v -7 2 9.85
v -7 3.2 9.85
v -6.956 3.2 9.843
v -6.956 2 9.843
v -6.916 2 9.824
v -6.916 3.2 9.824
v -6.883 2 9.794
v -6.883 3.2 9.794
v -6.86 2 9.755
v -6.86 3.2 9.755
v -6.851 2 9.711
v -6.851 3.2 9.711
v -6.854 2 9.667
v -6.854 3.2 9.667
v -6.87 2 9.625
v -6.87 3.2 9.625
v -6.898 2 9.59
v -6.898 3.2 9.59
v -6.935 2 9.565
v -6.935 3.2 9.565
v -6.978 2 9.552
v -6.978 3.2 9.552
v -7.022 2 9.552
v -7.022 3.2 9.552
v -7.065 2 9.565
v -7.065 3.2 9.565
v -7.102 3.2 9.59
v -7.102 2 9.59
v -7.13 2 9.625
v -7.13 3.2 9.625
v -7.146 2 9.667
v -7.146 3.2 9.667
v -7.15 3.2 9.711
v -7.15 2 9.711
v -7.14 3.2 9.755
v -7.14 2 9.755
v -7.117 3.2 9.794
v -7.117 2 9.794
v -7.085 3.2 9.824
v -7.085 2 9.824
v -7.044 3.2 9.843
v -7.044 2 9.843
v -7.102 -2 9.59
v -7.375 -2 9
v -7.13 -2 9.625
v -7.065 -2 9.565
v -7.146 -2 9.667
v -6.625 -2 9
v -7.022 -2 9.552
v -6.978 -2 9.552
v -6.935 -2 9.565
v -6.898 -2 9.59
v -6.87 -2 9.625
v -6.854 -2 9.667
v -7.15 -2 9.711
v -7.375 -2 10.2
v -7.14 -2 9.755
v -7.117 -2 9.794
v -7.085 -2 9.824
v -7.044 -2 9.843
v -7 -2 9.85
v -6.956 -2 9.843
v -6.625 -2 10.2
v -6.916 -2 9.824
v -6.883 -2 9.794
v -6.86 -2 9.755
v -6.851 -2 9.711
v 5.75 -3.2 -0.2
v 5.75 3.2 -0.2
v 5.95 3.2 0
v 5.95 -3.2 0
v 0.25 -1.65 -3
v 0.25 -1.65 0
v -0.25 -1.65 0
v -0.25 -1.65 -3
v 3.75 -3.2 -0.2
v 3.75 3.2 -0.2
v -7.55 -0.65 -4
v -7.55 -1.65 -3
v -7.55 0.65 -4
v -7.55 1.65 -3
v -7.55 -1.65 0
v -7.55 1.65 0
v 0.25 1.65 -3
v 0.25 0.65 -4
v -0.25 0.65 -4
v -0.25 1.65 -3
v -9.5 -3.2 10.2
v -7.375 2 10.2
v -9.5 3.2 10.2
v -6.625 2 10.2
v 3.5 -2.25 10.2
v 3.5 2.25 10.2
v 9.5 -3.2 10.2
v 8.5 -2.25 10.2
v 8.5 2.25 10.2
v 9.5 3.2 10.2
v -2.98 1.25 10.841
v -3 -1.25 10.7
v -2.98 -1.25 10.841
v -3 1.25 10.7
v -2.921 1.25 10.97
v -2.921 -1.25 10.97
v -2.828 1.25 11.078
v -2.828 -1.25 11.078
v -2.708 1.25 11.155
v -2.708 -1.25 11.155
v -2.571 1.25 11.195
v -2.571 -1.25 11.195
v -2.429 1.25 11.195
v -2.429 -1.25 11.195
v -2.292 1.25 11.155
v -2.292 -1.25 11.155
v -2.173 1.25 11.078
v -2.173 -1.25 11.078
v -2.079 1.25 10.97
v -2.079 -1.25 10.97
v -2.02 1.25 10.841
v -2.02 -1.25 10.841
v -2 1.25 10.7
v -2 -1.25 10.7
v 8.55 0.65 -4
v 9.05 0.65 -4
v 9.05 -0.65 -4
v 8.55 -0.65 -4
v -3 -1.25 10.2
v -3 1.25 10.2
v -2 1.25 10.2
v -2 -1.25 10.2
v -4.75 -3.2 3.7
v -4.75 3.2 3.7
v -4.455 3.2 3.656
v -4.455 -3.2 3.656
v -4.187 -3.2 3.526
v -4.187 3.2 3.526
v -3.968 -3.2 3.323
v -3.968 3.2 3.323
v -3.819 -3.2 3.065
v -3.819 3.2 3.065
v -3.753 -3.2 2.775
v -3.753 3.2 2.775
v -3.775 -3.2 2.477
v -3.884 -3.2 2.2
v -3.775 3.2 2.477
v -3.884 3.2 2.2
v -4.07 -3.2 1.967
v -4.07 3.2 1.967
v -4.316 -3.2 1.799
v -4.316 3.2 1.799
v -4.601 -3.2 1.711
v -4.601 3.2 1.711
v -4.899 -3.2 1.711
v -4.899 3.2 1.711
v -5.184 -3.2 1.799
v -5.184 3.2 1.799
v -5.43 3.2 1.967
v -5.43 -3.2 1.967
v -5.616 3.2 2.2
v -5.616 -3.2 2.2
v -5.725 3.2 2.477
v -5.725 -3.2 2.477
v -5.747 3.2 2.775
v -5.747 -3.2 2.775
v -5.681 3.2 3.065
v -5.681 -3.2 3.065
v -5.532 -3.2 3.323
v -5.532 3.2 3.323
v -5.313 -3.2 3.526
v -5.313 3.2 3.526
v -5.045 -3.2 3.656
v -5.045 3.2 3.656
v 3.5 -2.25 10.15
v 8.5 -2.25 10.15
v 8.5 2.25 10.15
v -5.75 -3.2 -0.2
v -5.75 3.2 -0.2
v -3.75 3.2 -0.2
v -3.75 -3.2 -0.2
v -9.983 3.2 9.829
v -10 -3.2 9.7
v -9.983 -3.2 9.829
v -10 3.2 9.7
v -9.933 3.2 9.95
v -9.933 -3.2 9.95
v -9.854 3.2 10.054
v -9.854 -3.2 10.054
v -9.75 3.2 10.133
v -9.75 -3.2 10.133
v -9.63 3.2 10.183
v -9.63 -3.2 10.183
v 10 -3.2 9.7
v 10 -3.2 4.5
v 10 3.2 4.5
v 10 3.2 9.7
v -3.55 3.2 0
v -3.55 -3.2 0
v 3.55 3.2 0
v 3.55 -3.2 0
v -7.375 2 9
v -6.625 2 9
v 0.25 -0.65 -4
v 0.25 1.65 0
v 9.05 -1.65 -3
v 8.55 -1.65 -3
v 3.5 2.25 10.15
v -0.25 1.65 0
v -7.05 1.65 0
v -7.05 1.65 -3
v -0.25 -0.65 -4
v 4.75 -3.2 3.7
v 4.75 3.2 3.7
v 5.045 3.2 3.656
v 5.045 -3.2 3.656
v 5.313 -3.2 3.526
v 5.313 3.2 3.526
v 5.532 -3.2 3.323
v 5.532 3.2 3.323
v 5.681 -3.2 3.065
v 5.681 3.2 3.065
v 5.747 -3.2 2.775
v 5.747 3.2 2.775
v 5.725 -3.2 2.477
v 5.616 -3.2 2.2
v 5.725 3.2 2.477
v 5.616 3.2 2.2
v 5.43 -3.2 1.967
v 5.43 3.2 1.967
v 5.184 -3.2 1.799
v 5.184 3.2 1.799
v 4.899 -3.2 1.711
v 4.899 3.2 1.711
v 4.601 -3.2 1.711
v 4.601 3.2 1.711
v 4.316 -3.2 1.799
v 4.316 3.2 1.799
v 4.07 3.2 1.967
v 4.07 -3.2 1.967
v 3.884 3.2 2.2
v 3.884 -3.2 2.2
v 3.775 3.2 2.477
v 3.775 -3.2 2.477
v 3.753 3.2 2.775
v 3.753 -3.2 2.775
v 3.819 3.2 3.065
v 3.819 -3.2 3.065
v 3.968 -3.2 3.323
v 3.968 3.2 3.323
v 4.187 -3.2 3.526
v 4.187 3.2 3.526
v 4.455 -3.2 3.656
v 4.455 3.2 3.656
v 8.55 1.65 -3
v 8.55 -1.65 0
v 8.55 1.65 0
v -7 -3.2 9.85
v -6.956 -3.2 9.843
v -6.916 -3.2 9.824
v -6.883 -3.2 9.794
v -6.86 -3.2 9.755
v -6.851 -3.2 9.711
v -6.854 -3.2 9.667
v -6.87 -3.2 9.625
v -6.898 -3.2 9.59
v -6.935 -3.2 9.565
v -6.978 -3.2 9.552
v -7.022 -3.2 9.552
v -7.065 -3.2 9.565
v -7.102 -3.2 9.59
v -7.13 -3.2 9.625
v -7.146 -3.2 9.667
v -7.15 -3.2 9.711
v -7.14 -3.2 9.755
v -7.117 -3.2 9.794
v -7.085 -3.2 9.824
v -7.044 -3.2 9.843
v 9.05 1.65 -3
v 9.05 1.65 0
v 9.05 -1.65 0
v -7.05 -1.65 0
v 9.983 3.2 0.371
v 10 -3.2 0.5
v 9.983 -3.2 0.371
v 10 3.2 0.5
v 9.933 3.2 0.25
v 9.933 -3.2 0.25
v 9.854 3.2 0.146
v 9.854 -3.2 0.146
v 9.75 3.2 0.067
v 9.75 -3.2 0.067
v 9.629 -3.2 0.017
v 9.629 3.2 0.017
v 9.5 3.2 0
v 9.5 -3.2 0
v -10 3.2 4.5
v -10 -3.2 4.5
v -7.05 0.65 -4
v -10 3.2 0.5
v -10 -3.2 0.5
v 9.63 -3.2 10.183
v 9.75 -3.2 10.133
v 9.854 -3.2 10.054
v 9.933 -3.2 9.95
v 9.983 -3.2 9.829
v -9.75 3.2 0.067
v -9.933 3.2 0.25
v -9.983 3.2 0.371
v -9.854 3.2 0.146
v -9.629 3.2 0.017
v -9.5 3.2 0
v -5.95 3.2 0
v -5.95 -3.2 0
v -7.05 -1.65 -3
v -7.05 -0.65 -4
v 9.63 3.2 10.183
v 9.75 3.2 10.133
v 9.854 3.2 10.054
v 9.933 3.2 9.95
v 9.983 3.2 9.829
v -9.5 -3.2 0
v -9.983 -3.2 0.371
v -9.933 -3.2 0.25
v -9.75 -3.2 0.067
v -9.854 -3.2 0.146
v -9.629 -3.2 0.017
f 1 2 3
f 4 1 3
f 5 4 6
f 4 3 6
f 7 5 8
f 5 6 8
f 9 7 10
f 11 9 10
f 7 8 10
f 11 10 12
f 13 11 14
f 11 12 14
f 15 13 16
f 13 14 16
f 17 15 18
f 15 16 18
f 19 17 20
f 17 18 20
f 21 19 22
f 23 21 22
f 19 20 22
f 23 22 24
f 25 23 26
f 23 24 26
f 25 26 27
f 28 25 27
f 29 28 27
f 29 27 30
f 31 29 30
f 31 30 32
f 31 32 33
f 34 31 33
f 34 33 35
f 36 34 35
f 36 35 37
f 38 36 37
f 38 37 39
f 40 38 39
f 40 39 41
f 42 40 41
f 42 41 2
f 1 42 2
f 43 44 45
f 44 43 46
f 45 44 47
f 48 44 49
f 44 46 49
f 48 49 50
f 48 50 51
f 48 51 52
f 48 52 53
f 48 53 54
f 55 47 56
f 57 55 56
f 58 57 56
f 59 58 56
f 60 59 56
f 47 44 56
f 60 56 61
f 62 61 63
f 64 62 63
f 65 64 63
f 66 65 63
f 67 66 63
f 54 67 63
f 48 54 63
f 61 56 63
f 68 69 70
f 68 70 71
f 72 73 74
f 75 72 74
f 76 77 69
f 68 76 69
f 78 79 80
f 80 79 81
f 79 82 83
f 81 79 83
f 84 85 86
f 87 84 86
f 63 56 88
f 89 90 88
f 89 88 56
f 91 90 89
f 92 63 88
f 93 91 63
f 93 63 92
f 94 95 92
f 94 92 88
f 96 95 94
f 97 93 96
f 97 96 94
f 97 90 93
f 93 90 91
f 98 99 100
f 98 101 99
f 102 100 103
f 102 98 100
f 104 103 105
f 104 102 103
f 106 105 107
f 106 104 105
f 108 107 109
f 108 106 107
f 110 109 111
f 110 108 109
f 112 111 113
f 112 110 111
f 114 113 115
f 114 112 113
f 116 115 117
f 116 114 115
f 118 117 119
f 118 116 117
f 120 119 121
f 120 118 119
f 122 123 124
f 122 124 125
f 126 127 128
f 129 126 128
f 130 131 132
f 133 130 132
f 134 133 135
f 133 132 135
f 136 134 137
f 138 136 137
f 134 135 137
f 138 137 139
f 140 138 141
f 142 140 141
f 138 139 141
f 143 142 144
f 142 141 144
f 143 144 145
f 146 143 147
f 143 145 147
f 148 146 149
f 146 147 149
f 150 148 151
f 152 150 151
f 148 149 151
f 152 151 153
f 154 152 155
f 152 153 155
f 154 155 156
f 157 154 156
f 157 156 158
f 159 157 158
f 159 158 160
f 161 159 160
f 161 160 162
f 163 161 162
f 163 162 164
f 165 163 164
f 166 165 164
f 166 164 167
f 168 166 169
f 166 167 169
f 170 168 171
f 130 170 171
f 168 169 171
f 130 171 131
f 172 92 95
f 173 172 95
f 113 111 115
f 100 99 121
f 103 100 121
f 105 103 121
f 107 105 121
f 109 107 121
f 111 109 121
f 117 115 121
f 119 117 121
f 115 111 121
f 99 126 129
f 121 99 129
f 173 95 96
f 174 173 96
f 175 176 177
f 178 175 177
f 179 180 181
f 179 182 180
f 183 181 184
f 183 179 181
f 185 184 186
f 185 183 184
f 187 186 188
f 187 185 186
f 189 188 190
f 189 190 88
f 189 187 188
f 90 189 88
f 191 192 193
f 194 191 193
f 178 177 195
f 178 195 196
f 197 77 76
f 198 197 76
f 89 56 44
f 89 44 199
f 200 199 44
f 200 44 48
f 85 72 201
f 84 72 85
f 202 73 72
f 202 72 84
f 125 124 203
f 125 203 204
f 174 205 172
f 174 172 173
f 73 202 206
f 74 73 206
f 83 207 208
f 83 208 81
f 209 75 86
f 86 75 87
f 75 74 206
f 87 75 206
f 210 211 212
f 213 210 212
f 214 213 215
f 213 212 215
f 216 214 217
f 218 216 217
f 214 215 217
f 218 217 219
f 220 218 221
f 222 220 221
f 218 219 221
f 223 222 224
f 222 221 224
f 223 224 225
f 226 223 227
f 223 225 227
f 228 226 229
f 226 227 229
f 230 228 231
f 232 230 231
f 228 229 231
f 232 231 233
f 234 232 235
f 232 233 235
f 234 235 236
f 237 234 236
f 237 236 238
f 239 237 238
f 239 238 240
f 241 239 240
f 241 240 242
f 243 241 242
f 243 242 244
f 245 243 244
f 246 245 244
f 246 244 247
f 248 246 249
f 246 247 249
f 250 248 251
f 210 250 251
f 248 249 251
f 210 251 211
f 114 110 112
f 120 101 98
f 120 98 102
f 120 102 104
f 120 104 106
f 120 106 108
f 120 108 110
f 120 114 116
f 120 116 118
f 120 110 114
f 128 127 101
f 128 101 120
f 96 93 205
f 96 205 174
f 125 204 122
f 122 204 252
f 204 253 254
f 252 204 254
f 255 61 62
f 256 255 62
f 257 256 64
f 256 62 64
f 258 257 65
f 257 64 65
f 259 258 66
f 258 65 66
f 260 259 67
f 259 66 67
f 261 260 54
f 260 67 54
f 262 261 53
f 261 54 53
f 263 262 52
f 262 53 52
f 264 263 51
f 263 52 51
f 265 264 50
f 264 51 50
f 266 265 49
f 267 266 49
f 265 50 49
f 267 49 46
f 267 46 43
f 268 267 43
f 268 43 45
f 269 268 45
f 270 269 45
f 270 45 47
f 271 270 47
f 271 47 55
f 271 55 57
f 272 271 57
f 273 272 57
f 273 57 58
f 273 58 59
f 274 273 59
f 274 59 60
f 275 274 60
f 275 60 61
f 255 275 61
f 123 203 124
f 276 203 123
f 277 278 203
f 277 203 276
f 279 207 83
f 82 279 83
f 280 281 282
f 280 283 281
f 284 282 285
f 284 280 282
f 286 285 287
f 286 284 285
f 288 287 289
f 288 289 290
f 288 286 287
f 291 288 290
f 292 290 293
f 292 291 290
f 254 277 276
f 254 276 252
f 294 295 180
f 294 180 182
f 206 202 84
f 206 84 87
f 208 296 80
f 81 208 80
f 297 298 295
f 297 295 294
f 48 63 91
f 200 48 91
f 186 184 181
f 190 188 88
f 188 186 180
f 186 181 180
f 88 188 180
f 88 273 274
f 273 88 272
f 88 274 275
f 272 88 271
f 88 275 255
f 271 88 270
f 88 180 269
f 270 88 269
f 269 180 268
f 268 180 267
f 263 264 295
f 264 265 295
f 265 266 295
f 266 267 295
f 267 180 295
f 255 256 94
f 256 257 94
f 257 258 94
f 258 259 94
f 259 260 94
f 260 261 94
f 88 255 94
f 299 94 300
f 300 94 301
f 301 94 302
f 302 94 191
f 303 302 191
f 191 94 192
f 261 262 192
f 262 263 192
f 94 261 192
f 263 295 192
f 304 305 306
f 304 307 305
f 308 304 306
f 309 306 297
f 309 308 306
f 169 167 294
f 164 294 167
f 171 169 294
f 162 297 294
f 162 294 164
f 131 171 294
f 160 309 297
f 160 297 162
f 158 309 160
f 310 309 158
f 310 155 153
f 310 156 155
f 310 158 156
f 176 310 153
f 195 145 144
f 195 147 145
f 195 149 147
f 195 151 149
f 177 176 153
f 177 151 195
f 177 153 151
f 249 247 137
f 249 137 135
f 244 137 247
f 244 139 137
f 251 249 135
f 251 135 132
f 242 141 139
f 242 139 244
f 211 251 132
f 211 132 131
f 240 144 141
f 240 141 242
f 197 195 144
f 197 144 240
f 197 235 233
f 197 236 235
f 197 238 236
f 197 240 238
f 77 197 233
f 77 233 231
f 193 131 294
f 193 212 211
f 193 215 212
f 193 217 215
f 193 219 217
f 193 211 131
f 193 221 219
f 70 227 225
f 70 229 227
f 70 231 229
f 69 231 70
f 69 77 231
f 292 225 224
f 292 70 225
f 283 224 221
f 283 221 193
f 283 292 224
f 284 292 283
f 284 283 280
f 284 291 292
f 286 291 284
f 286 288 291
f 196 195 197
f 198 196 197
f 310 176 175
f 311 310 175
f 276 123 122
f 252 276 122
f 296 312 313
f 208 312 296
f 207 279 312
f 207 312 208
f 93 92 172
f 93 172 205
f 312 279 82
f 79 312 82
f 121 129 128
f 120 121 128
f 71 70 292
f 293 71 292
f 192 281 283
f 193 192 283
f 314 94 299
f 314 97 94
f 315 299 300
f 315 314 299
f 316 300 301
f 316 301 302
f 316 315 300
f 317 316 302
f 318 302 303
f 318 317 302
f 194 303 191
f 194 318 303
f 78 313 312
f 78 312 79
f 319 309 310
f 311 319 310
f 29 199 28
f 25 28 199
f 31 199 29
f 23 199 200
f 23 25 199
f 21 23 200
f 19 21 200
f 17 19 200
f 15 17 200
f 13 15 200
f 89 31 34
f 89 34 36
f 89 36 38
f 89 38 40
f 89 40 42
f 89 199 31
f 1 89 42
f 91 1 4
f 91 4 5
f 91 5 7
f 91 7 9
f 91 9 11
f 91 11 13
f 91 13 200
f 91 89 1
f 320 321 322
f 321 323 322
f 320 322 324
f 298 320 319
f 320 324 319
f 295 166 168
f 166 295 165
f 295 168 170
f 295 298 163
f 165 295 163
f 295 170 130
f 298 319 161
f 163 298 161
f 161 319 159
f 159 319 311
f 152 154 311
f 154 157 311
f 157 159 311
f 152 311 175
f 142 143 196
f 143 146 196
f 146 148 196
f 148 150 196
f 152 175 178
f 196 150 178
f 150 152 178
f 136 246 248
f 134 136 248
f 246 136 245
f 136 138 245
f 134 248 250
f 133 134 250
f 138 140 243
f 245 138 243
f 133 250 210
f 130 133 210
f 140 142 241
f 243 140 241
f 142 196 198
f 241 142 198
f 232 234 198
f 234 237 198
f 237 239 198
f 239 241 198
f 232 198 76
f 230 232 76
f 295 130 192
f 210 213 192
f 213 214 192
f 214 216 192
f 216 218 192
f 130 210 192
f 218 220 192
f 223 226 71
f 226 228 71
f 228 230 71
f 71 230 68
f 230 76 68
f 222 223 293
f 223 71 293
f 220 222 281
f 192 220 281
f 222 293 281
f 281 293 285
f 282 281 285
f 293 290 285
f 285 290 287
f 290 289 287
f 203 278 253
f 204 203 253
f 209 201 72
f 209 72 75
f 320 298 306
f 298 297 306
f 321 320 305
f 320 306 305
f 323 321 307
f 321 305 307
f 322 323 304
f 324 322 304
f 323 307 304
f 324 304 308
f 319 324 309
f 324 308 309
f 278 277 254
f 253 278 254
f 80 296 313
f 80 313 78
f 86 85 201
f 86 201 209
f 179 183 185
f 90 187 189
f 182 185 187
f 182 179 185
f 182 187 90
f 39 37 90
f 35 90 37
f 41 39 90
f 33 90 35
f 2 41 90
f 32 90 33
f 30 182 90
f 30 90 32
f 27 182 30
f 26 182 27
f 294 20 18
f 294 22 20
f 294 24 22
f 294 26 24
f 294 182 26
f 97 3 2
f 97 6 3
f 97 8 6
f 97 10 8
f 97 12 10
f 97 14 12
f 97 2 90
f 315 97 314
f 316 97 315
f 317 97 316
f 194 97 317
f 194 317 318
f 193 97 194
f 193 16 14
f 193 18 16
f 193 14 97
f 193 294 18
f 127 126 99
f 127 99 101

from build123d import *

# Parameters (mm, degrees)
BASE_SKETCH_W               = 20
BASE_SKETCH_H               = 6.4
BASE_EXTRUDE_DEPTH          = 4.5
CONTACTS_SKETCH_W           = 0.5
CONTACTS_SKETCH_H           = 3.3
CONTACTS_EXTRUDE_DEPTH      = 4
CONTACTS_EXTRUDE_2_DEPTH    = 4
CONTACTS_EXTRUDE_3_DEPTH    = 4
CONTACT_1_CHAMFER_SIZE      = 1
CHAMFER1_SIZE               = 1
CHAMFER2_SIZE               = 1
MOUNTING_HOLES_SKETCH_R     = 1
CUT_MOUNTING_HOLES_DEPTH    = 6.4
BOTTOM_PROTRUSIONS_SKETCH_W = 2
BOTTOM_PROTRUSIONS_SKETCH_H = 0.2
BOTTOM_PROTRUSIONS_DEPTH    = 6.4
CHAMFER_PROTRUSIONS_SIZE    = 0.2
TOP_SKETCH_W                = 20.0002
TOP_SKETCH_H                = 6.4002
TOP_EXTRUDE_DEPTH           = 5.7
BUTTON_SKETCH_W             = 1
BUTTON_SKETCH_H             = 2.5
BUTTON_EXTRUDE_DEPTH        = 1
BUTTON_FILLET_RADIUS        = 0.5
BUTTON_FILLET_LENGTH        = 2.5
TOP_INDENT_SKETCH_W         = 5
TOP_INDENT_SKETCH_H         = 4.5
TOP_INDENT_CUT_DEPTH        = 0.05
PIVOT_HOLE_SKETCH_R         = 0.15
LEVER_PIVOT_HOLE_CUT_DEPTH  = 10
LEVER_RECESS_SKETCH_W       = 0.75
LEVER_RECESS_SKETCH_H       = 4
LEVER_RECESS_CUT_DEPTH      = 1.2
CORNER_FILLET_R             = 0.5


with BuildPart() as part:
    # Base Sketch → Base Extrude (new body)
    with BuildSketch(Plane.XY):
        Rectangle(BASE_SKETCH_W, BASE_SKETCH_H)
    extrude(amount=BASE_EXTRUDE_DEPTH)

    # Mounting Holes Sketch → Cut Mounting Holes (cut)
    with BuildSketch(Plane(origin=(0, 3.2, 0), x_dir=(1, 0, 0), z_dir=(0, 1, 0))):
        with Locations(Location((-4.75, -2.7, 0), (0, 0, 270))):
            Circle(MOUNTING_HOLES_SKETCH_R)
        with Locations(Location((4.75, -2.7, 0), (0, 0, 270))):
            Circle(MOUNTING_HOLES_SKETCH_R)
    extrude(amount=-CUT_MOUNTING_HOLES_DEPTH, mode=Mode.SUBTRACT)

    # Bottom Protrusions Sketch → Bottom Protrusions (add)
    with BuildSketch(Plane(origin=(0, 3.2, 0), x_dir=(1, 0, 0), z_dir=(0, 1, 0))):
        with Locations((-4.75, 0.1)):
            Rectangle(BOTTOM_PROTRUSIONS_SKETCH_W, BOTTOM_PROTRUSIONS_SKETCH_H)
        with Locations((4.75, 0.1)):
            Rectangle(BOTTOM_PROTRUSIONS_SKETCH_W, BOTTOM_PROTRUSIONS_SKETCH_H)
    extrude(amount=-BOTTOM_PROTRUSIONS_DEPTH)

    # Chamfer Protrusions
    chamfer_protrusions_edges = [part.edges().sort_by_distance(p)[0] for p in [
        (5.75, 0, 0),
        (3.75, 0, 0),
        (-3.75, 0, 0),
        (-5.75, 0, 0),
    ]]
    chamfer(chamfer_protrusions_edges, length=CHAMFER_PROTRUSIONS_SIZE - 0.0001)  # a hair under: the kernel refuses the full size

    # Top Sketch → Top Extrude (add)
    with BuildSketch(Plane.XY.offset(4.5)):
        Rectangle(TOP_SKETCH_W, TOP_SKETCH_H)
    extrude(amount=TOP_EXTRUDE_DEPTH)

    # Top Indent Sketch → Top Indent Cut (cut)
    with BuildSketch(Plane.XY.offset(10.2)):
        with Locations((6.0001, 0)):
            Rectangle(TOP_INDENT_SKETCH_W, TOP_INDENT_SKETCH_H)
    extrude(amount=-TOP_INDENT_CUT_DEPTH, mode=Mode.SUBTRACT)

    # Pivot Hole Sketch → Lever Pivot Hole Cut (cut)
    with BuildSketch(Plane(origin=(0, 3.2001, 0), x_dir=(1, 0, 0), z_dir=(0, 1, 0))):
        with Locations(Location((-7.000095614, -9.7, 0), (0, 0, 270))):
            Circle(PIVOT_HOLE_SKETCH_R)
    extrude(amount=-LEVER_PIVOT_HOLE_CUT_DEPTH, mode=Mode.SUBTRACT)

    # Lever Recess Sketch → Lever Recess Cut (cut)
    with BuildSketch(Plane.XY.offset(10.2)):
        with Locations((-7.0001, 0)):
            Rectangle(LEVER_RECESS_SKETCH_W, LEVER_RECESS_SKETCH_H)
    extrude(amount=-LEVER_RECESS_CUT_DEPTH, mode=Mode.SUBTRACT)

    # Corner Fillet
    corner_fillet_edges = [part.edges().sort_by_distance(p)[0] for p in [
        (10.0001, 0, 10.2),
        (-10.0001, 0, 10.2),
        (-10, 0, 0),
        (10, 0, 0),
    ]]
    fillet(corner_fillet_edges, radius=CORNER_FILLET_R)


with BuildPart() as body_2:
    # Contacts Sketch → Contacts Extrude (new body)
    with BuildSketch(Plane(origin=(0, 0, 0), x_dir=(-1, 0, 0), z_dir=(0, 0, -1))):
        Rectangle(CONTACTS_SKETCH_W, CONTACTS_SKETCH_H)
    extrude(amount=CONTACTS_EXTRUDE_DEPTH)

    # Chamfer1
    chamfer1_edges = [body_2.edges().sort_by_distance(p)[0] for p in [
        (0, -1.65, -4),
        (0, 1.65, -4),
    ]]
    chamfer(chamfer1_edges, length=CHAMFER1_SIZE)


with BuildPart() as body_3:
    # Contacts Sketch → Contacts Extrude 2 (new body)
    with BuildSketch(Plane(origin=(0, 0, 0), x_dir=(-1, 0, 0), z_dir=(0, 0, -1))):
        with Locations((-8.8, 0)):
            Rectangle(CONTACTS_SKETCH_W, CONTACTS_SKETCH_H)
    extrude(amount=CONTACTS_EXTRUDE_2_DEPTH)

    # Chamfer2
    chamfer2_edges = [body_3.edges().sort_by_distance(p)[0] for p in [
        (8.8, -1.65, -4),
        (8.8, 1.65, -4),
    ]]
    chamfer(chamfer2_edges, length=CHAMFER2_SIZE)


with BuildPart() as body_4:
    # Contacts Sketch → Contacts Extrude 3 (new body)
    with BuildSketch(Plane(origin=(0, 0, 0), x_dir=(-1, 0, 0), z_dir=(0, 0, -1))):
        with Locations((7.3, 0)):
            Rectangle(CONTACTS_SKETCH_W, CONTACTS_SKETCH_H)
    extrude(amount=CONTACTS_EXTRUDE_3_DEPTH)

    # Contact 1 Chamfer
    contact_1_chamfer_edges = [body_4.edges().sort_by_distance(p)[0] for p in [
        (-7.3, -1.65, -4),
        (-7.3, 1.65, -4),
    ]]
    chamfer(contact_1_chamfer_edges, length=CONTACT_1_CHAMFER_SIZE)


with BuildPart() as body_5:
    # Button Sketch → Button Extrude (new body)
    with BuildSketch(Plane.XY.offset(10.2)):
        with Locations((-2.5001, 0)):
            Rectangle(BUTTON_SKETCH_W, BUTTON_SKETCH_H)
    extrude(amount=BUTTON_EXTRUDE_DEPTH)

    # Button Fillet: full round fillet: the end face becomes a half cylinder, R = half its width
    button_fillet_face = Plane((-2.5001, 0, 11.2), x_dir=(0, 1, 0), z_dir=(0, 0, 1))  # on the end face: x along it, z out of the body
    button_fillet_slab = button_fillet_face.offset(-BUTTON_FILLET_RADIUS / 2) * Box(BUTTON_FILLET_LENGTH, 2 * BUTTON_FILLET_RADIUS, BUTTON_FILLET_RADIUS, mode=Mode.PRIVATE)  # the body's end, R deep
    button_fillet_round = Plane((-2.5001, 0, 10.7), x_dir=(0, 0, 1), z_dir=(0, 1, 0)) * Cylinder(BUTTON_FILLET_RADIUS, BUTTON_FILLET_LENGTH, mode=Mode.PRIVATE)  # its axis R under the face
    add(button_fillet_slab - button_fillet_round, mode=Mode.SUBTRACT)


solid = Compound([part.part, body_2.part, body_3.part, body_4.part, body_5.part])
